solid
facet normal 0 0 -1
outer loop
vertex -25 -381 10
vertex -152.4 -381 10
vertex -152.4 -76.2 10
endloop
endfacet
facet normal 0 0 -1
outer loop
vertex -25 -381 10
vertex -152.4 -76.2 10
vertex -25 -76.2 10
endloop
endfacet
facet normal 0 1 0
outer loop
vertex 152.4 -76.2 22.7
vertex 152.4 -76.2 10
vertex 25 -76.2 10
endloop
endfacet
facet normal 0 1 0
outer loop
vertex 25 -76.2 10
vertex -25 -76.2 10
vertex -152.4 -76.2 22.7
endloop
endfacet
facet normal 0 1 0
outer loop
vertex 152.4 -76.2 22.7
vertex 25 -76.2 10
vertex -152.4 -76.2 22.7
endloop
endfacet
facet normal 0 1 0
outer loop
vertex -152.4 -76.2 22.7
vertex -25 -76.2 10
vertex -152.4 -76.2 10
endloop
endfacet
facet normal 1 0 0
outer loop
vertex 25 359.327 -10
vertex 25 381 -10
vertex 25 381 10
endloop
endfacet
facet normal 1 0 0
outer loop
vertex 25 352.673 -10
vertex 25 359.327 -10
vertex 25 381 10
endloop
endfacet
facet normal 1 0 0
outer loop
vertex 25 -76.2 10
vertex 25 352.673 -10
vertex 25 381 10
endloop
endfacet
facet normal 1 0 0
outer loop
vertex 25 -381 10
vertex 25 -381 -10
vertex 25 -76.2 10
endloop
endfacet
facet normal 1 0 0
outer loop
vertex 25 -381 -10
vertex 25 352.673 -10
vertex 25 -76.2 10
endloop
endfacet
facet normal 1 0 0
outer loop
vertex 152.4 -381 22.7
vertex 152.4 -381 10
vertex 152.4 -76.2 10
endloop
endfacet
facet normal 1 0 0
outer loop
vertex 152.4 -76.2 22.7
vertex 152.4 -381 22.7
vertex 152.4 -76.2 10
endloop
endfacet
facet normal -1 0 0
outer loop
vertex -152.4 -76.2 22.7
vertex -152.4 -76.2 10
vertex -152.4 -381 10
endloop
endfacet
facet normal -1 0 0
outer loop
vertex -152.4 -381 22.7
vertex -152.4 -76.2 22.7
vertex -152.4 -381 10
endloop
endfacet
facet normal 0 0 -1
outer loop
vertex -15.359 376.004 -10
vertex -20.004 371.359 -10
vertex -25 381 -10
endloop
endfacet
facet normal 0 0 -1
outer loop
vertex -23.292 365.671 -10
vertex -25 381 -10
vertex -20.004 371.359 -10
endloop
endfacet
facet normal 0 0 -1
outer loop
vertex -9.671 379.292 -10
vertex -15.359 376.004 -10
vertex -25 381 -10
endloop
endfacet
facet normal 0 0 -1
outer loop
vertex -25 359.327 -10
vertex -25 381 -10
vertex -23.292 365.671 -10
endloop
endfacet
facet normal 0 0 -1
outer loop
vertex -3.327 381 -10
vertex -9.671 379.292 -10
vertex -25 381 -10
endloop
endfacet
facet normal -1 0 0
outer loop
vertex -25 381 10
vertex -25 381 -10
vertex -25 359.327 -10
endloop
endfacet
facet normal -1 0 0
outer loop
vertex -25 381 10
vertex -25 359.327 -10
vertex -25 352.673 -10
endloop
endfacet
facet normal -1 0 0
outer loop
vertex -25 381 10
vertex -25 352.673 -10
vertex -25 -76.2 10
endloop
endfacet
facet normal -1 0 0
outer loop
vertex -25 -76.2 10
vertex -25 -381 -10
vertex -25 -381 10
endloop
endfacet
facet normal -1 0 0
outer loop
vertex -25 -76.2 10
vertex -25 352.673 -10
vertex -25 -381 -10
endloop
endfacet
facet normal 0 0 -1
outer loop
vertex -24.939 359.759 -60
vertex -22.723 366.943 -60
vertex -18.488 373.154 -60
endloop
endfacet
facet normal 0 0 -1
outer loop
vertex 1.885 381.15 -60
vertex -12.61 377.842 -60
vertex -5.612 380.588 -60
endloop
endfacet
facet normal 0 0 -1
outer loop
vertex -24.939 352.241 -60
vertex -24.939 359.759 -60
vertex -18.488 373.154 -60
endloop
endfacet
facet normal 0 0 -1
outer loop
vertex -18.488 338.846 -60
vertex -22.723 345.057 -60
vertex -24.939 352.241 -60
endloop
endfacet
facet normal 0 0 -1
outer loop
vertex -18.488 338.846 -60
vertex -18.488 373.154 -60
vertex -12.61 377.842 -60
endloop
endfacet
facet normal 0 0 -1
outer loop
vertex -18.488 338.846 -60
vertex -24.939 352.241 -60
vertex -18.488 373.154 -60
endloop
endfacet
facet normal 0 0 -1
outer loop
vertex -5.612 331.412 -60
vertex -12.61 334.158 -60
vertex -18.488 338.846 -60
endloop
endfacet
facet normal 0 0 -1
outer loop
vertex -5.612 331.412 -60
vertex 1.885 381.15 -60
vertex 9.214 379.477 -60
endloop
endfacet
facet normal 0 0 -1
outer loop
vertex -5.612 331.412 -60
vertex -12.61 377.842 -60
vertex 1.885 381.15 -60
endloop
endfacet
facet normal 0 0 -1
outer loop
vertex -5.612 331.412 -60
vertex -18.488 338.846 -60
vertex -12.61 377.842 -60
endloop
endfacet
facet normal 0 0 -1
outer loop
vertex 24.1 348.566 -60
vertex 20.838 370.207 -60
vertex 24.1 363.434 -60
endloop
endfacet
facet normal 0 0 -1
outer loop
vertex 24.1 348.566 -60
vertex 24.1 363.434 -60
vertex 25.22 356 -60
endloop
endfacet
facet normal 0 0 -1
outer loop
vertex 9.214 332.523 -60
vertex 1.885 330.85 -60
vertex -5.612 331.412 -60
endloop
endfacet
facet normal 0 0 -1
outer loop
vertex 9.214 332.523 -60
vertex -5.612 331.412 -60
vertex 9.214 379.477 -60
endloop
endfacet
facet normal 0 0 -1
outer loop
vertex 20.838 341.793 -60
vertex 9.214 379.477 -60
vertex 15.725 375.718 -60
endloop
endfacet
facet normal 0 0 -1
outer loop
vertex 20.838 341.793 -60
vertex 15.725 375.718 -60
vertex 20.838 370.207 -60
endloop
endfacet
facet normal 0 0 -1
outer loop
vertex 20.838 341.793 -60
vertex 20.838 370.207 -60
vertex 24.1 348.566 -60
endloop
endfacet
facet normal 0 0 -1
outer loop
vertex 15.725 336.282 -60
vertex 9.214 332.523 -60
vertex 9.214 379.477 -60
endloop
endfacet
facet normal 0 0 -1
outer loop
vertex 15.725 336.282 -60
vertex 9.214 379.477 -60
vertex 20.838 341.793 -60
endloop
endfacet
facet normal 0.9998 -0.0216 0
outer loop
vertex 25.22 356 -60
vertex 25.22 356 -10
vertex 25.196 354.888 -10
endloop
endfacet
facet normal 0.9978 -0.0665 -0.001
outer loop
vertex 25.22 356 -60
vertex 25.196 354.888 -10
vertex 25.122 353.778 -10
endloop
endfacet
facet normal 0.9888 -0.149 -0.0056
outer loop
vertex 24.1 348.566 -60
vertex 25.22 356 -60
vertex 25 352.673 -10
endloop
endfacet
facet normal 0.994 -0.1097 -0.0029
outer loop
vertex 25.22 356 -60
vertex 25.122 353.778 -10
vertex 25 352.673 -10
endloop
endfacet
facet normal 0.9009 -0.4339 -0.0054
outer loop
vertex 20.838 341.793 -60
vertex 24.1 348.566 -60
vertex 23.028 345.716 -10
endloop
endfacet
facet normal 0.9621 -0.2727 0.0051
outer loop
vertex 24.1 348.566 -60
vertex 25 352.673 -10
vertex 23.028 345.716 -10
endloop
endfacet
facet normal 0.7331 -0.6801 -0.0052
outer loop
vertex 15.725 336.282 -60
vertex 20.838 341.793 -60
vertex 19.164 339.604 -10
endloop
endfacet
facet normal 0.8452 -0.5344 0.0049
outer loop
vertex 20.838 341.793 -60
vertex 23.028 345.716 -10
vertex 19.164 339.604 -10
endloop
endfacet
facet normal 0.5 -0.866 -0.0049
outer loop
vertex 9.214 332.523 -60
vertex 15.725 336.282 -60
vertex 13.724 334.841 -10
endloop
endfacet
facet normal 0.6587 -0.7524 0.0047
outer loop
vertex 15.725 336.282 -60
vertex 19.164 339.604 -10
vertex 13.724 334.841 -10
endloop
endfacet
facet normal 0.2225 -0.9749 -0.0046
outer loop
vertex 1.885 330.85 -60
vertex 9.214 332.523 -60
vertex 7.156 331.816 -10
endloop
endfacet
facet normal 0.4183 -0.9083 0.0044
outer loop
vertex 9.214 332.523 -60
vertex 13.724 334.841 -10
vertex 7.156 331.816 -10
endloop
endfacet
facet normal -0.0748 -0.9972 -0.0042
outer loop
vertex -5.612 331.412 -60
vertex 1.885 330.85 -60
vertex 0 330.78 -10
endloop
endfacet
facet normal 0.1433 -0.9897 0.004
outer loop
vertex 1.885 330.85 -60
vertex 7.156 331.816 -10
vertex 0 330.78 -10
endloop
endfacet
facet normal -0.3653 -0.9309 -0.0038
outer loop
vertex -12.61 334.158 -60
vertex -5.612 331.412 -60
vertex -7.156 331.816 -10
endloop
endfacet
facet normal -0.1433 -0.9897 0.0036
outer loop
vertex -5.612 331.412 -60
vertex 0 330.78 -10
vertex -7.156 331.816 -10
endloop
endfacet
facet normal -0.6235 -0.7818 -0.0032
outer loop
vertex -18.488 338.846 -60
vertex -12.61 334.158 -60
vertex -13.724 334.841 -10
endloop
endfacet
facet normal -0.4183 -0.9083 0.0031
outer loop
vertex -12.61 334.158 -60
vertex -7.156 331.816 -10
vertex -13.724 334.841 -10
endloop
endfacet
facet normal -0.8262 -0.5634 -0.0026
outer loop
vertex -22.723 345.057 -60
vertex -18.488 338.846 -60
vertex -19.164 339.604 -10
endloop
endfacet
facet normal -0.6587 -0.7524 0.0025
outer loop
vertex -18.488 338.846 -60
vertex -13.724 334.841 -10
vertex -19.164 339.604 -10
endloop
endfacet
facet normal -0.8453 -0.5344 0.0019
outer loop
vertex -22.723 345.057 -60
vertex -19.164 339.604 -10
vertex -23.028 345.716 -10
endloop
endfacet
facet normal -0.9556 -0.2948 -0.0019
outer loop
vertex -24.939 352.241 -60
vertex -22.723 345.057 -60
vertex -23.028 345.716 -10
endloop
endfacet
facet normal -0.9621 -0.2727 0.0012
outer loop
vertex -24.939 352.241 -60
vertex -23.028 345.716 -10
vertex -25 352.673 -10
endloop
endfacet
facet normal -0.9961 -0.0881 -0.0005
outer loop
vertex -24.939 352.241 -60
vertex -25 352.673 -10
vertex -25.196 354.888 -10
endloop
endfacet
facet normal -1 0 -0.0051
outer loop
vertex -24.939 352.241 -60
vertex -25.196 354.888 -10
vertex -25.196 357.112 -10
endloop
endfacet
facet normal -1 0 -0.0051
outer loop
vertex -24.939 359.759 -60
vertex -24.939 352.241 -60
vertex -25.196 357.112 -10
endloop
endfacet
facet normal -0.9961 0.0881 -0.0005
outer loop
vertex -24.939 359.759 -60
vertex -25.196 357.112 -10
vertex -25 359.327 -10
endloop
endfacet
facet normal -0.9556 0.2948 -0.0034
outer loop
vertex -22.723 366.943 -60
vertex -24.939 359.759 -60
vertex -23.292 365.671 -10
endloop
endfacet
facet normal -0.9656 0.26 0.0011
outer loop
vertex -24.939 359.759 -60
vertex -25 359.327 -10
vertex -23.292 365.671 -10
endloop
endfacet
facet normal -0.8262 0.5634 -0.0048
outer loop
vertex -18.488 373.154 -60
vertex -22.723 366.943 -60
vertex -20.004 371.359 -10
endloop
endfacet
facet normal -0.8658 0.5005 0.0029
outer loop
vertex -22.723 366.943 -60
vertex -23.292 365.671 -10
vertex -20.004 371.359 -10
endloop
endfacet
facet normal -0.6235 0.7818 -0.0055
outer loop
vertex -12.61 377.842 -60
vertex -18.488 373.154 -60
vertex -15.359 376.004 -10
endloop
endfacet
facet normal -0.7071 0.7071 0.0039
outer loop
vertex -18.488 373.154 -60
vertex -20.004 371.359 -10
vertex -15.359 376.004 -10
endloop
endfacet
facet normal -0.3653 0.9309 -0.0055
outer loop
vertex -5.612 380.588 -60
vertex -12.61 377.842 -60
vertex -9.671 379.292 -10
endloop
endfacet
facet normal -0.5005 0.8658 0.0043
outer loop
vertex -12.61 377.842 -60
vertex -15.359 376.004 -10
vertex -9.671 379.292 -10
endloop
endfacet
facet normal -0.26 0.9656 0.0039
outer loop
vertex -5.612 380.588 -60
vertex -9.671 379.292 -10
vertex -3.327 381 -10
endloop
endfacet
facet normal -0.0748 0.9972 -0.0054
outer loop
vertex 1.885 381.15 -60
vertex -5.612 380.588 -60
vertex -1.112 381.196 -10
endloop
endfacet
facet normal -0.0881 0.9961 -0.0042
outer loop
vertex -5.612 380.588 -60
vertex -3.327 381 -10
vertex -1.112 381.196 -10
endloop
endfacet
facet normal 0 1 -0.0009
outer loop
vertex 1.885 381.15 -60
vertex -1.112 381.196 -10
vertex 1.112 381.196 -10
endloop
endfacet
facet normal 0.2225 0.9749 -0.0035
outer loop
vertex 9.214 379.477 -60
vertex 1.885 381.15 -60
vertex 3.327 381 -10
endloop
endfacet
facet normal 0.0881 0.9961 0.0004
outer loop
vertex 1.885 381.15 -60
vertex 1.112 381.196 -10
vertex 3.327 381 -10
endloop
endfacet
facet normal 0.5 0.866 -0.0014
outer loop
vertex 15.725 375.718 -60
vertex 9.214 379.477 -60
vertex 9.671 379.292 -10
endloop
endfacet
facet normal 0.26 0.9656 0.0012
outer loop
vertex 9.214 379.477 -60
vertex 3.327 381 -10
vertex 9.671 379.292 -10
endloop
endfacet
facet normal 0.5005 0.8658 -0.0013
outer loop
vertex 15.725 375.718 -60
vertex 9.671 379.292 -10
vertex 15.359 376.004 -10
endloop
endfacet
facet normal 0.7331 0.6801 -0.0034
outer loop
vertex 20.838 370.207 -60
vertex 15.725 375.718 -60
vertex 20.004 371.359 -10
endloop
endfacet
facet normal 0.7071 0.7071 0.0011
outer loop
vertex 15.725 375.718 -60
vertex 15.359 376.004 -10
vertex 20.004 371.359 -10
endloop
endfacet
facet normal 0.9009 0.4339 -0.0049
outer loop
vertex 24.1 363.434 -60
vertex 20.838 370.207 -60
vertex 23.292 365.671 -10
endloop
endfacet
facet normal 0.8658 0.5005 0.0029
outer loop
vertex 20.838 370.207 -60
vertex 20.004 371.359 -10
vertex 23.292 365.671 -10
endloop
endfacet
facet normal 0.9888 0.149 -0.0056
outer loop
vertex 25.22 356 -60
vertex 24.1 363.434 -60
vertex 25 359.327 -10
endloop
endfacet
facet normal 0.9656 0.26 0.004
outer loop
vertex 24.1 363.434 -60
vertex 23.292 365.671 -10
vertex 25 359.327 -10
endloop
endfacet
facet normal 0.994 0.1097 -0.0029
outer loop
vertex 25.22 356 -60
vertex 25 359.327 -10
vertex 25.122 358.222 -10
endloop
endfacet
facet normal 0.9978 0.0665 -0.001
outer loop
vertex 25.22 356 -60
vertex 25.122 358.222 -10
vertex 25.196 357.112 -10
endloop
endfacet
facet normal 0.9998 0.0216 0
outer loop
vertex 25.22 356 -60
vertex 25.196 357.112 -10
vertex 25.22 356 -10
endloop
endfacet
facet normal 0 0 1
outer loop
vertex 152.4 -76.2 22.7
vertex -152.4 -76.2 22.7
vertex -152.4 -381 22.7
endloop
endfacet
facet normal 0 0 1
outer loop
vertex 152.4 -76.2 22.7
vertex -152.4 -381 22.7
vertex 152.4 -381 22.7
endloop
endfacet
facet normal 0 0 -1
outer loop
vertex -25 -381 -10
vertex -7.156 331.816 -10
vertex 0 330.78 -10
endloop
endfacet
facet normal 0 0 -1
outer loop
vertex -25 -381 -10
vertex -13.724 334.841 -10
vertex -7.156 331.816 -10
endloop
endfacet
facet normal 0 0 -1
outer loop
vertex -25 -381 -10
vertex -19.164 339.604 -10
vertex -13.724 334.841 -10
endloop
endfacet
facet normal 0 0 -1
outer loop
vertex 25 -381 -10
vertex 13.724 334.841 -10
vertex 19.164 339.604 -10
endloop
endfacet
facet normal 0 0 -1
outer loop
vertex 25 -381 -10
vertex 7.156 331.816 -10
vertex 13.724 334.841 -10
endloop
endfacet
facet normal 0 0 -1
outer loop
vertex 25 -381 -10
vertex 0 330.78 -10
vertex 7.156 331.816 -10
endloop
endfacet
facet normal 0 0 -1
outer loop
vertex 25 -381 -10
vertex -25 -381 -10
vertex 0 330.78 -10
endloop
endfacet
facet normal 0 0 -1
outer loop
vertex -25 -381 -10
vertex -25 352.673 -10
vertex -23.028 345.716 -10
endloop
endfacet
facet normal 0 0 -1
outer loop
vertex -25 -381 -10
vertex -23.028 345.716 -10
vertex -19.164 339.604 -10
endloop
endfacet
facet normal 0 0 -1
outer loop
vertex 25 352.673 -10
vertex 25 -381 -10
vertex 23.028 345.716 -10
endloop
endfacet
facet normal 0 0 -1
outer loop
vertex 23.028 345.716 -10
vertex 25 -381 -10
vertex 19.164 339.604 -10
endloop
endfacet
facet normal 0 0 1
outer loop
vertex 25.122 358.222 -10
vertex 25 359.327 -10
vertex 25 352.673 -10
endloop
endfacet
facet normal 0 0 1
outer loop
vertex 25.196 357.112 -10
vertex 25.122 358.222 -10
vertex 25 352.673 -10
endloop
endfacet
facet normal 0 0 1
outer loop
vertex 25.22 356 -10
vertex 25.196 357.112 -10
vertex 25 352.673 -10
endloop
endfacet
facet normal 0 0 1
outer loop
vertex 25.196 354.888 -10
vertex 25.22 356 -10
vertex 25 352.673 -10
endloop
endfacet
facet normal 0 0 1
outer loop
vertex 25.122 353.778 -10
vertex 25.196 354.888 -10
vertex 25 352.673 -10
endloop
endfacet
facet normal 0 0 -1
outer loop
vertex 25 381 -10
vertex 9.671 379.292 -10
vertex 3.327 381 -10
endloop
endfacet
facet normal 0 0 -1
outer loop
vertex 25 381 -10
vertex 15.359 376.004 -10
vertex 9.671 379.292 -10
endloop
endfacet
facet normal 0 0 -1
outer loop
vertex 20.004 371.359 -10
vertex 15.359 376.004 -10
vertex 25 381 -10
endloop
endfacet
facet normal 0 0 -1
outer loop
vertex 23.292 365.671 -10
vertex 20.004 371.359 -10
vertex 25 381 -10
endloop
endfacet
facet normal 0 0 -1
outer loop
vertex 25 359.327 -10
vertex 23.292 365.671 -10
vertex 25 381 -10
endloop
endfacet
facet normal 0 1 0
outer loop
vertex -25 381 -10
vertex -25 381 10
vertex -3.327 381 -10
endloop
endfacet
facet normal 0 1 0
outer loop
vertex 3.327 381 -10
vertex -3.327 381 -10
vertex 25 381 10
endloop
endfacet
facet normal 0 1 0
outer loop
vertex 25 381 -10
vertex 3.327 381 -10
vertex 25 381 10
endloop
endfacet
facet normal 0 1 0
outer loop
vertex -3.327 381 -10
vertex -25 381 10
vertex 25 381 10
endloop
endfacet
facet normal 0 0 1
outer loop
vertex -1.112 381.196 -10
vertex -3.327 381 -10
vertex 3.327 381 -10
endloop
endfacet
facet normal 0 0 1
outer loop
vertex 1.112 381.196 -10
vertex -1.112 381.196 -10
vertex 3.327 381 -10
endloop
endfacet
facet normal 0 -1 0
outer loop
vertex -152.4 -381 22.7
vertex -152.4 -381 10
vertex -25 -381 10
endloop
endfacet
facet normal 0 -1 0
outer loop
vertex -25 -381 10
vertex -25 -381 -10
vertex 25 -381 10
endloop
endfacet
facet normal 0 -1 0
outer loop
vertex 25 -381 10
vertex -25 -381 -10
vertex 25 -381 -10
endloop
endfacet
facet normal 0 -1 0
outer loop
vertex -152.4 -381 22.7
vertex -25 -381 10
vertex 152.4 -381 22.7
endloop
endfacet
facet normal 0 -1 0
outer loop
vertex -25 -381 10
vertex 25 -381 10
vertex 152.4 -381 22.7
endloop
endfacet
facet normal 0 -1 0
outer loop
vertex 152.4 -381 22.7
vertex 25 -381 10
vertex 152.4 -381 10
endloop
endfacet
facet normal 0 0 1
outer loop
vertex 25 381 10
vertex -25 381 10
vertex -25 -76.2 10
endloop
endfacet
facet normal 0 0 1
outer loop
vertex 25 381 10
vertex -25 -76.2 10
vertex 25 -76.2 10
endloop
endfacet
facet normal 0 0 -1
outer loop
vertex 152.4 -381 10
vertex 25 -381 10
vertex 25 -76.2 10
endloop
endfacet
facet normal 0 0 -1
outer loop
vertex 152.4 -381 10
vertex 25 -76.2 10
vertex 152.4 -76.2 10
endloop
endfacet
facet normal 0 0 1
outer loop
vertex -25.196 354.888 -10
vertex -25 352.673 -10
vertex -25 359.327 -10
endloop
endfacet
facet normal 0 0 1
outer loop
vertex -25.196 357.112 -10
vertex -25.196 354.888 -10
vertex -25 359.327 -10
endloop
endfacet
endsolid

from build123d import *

# Parameters (mm, degrees)
F0_W     = 50
F0_H     = 20
F1_DEPTH = 381
F2_R     = 25.220427
F3_DEPTH = 50
F5_DEPTH = 12.7


with BuildPart() as f1:
    # F0 (on Front) → F1 (new body, symmetric)
    with BuildSketch(Plane.XZ):
        Rectangle(F0_W, F0_H)
    extrude(amount=F1_DEPTH, both=True)

    # F2 (on face) → F3 (join)
    with BuildSketch(Plane(origin=(0, 0, -10), x_dir=(1, 0, 0), z_dir=(0, 0, -1))):
        with Locations((0, -356)):
            Circle(F2_R)
    extrude(amount=F3_DEPTH)

    # F4 (on face) → F5 (join)
    with BuildSketch(Plane.XY.offset(10)):
        Polygon((-152.4, -76.2), (-152.4, -381), (0, -381), (152.4, -381), (152.4, -76.2), align=None)
    extrude(amount=F5_DEPTH)


solid = f1.part
